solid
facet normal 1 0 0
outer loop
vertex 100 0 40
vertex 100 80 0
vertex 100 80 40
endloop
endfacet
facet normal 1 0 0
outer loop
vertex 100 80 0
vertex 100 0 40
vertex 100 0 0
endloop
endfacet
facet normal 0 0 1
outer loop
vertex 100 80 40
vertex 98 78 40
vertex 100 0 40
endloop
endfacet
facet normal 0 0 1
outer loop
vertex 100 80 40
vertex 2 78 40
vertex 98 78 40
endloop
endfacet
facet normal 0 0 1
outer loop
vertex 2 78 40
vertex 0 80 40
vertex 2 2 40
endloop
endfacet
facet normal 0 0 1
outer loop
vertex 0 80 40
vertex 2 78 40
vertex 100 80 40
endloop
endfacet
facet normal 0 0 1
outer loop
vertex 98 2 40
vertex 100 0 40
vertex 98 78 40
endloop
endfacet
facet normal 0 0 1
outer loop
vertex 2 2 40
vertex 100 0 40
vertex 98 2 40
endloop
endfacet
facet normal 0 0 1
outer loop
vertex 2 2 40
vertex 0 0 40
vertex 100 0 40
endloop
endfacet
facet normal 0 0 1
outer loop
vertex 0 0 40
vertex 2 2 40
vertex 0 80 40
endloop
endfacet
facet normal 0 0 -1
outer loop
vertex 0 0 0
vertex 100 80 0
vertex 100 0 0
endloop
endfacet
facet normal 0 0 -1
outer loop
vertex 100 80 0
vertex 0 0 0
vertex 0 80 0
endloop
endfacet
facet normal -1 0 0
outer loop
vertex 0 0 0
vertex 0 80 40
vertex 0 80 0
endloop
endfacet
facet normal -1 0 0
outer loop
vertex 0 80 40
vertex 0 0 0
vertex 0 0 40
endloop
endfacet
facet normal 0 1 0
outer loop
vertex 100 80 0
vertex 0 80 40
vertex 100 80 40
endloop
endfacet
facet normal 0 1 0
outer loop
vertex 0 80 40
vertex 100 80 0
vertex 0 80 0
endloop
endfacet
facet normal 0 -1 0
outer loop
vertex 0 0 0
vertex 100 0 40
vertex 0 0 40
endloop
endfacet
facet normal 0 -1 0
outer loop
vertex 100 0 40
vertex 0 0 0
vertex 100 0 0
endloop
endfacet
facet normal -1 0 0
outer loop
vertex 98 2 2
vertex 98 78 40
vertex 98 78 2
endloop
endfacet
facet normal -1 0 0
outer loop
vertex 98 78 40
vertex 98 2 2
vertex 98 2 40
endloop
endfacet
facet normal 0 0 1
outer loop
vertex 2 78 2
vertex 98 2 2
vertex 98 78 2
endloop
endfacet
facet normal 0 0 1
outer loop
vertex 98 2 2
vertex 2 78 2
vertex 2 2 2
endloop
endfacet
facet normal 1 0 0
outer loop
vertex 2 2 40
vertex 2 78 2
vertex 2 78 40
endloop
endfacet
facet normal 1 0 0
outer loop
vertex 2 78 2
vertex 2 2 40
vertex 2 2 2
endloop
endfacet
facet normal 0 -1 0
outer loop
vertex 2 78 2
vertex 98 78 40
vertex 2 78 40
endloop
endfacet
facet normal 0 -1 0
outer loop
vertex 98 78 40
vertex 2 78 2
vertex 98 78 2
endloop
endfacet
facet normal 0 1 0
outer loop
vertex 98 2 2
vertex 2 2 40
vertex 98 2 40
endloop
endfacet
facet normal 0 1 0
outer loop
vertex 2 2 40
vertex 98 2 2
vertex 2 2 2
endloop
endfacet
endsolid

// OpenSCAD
/* [Dimensions] */
// Overall width in millimetres
width = 100; // [10:5:200]
// Overall depth in millimetres
depth = 80; // [10:5:200]
// Overall height in millimetres
height = 40; // [10:5:100]

/* [Appearance] */
// Add a lid
lid = false;
// Surface finish
finish = "smooth"; // [smooth:Smooth,rough:Rough]
// Label text
label = "A \"quoted\" box";
// Position in millimetres
offset = [0, 0, 0]; // [-10:1:10]
// Wall thickness
wall = 2; // [1:Thin,2:Standard,3:Thick]

/* [Hidden] */
internal = 8;

translate(offset)
  difference() {
    cube([width, depth, height]);
    translate([wall, wall, wall])
      cube([width - 2 * wall, depth - 2 * wall, height]);
  }
